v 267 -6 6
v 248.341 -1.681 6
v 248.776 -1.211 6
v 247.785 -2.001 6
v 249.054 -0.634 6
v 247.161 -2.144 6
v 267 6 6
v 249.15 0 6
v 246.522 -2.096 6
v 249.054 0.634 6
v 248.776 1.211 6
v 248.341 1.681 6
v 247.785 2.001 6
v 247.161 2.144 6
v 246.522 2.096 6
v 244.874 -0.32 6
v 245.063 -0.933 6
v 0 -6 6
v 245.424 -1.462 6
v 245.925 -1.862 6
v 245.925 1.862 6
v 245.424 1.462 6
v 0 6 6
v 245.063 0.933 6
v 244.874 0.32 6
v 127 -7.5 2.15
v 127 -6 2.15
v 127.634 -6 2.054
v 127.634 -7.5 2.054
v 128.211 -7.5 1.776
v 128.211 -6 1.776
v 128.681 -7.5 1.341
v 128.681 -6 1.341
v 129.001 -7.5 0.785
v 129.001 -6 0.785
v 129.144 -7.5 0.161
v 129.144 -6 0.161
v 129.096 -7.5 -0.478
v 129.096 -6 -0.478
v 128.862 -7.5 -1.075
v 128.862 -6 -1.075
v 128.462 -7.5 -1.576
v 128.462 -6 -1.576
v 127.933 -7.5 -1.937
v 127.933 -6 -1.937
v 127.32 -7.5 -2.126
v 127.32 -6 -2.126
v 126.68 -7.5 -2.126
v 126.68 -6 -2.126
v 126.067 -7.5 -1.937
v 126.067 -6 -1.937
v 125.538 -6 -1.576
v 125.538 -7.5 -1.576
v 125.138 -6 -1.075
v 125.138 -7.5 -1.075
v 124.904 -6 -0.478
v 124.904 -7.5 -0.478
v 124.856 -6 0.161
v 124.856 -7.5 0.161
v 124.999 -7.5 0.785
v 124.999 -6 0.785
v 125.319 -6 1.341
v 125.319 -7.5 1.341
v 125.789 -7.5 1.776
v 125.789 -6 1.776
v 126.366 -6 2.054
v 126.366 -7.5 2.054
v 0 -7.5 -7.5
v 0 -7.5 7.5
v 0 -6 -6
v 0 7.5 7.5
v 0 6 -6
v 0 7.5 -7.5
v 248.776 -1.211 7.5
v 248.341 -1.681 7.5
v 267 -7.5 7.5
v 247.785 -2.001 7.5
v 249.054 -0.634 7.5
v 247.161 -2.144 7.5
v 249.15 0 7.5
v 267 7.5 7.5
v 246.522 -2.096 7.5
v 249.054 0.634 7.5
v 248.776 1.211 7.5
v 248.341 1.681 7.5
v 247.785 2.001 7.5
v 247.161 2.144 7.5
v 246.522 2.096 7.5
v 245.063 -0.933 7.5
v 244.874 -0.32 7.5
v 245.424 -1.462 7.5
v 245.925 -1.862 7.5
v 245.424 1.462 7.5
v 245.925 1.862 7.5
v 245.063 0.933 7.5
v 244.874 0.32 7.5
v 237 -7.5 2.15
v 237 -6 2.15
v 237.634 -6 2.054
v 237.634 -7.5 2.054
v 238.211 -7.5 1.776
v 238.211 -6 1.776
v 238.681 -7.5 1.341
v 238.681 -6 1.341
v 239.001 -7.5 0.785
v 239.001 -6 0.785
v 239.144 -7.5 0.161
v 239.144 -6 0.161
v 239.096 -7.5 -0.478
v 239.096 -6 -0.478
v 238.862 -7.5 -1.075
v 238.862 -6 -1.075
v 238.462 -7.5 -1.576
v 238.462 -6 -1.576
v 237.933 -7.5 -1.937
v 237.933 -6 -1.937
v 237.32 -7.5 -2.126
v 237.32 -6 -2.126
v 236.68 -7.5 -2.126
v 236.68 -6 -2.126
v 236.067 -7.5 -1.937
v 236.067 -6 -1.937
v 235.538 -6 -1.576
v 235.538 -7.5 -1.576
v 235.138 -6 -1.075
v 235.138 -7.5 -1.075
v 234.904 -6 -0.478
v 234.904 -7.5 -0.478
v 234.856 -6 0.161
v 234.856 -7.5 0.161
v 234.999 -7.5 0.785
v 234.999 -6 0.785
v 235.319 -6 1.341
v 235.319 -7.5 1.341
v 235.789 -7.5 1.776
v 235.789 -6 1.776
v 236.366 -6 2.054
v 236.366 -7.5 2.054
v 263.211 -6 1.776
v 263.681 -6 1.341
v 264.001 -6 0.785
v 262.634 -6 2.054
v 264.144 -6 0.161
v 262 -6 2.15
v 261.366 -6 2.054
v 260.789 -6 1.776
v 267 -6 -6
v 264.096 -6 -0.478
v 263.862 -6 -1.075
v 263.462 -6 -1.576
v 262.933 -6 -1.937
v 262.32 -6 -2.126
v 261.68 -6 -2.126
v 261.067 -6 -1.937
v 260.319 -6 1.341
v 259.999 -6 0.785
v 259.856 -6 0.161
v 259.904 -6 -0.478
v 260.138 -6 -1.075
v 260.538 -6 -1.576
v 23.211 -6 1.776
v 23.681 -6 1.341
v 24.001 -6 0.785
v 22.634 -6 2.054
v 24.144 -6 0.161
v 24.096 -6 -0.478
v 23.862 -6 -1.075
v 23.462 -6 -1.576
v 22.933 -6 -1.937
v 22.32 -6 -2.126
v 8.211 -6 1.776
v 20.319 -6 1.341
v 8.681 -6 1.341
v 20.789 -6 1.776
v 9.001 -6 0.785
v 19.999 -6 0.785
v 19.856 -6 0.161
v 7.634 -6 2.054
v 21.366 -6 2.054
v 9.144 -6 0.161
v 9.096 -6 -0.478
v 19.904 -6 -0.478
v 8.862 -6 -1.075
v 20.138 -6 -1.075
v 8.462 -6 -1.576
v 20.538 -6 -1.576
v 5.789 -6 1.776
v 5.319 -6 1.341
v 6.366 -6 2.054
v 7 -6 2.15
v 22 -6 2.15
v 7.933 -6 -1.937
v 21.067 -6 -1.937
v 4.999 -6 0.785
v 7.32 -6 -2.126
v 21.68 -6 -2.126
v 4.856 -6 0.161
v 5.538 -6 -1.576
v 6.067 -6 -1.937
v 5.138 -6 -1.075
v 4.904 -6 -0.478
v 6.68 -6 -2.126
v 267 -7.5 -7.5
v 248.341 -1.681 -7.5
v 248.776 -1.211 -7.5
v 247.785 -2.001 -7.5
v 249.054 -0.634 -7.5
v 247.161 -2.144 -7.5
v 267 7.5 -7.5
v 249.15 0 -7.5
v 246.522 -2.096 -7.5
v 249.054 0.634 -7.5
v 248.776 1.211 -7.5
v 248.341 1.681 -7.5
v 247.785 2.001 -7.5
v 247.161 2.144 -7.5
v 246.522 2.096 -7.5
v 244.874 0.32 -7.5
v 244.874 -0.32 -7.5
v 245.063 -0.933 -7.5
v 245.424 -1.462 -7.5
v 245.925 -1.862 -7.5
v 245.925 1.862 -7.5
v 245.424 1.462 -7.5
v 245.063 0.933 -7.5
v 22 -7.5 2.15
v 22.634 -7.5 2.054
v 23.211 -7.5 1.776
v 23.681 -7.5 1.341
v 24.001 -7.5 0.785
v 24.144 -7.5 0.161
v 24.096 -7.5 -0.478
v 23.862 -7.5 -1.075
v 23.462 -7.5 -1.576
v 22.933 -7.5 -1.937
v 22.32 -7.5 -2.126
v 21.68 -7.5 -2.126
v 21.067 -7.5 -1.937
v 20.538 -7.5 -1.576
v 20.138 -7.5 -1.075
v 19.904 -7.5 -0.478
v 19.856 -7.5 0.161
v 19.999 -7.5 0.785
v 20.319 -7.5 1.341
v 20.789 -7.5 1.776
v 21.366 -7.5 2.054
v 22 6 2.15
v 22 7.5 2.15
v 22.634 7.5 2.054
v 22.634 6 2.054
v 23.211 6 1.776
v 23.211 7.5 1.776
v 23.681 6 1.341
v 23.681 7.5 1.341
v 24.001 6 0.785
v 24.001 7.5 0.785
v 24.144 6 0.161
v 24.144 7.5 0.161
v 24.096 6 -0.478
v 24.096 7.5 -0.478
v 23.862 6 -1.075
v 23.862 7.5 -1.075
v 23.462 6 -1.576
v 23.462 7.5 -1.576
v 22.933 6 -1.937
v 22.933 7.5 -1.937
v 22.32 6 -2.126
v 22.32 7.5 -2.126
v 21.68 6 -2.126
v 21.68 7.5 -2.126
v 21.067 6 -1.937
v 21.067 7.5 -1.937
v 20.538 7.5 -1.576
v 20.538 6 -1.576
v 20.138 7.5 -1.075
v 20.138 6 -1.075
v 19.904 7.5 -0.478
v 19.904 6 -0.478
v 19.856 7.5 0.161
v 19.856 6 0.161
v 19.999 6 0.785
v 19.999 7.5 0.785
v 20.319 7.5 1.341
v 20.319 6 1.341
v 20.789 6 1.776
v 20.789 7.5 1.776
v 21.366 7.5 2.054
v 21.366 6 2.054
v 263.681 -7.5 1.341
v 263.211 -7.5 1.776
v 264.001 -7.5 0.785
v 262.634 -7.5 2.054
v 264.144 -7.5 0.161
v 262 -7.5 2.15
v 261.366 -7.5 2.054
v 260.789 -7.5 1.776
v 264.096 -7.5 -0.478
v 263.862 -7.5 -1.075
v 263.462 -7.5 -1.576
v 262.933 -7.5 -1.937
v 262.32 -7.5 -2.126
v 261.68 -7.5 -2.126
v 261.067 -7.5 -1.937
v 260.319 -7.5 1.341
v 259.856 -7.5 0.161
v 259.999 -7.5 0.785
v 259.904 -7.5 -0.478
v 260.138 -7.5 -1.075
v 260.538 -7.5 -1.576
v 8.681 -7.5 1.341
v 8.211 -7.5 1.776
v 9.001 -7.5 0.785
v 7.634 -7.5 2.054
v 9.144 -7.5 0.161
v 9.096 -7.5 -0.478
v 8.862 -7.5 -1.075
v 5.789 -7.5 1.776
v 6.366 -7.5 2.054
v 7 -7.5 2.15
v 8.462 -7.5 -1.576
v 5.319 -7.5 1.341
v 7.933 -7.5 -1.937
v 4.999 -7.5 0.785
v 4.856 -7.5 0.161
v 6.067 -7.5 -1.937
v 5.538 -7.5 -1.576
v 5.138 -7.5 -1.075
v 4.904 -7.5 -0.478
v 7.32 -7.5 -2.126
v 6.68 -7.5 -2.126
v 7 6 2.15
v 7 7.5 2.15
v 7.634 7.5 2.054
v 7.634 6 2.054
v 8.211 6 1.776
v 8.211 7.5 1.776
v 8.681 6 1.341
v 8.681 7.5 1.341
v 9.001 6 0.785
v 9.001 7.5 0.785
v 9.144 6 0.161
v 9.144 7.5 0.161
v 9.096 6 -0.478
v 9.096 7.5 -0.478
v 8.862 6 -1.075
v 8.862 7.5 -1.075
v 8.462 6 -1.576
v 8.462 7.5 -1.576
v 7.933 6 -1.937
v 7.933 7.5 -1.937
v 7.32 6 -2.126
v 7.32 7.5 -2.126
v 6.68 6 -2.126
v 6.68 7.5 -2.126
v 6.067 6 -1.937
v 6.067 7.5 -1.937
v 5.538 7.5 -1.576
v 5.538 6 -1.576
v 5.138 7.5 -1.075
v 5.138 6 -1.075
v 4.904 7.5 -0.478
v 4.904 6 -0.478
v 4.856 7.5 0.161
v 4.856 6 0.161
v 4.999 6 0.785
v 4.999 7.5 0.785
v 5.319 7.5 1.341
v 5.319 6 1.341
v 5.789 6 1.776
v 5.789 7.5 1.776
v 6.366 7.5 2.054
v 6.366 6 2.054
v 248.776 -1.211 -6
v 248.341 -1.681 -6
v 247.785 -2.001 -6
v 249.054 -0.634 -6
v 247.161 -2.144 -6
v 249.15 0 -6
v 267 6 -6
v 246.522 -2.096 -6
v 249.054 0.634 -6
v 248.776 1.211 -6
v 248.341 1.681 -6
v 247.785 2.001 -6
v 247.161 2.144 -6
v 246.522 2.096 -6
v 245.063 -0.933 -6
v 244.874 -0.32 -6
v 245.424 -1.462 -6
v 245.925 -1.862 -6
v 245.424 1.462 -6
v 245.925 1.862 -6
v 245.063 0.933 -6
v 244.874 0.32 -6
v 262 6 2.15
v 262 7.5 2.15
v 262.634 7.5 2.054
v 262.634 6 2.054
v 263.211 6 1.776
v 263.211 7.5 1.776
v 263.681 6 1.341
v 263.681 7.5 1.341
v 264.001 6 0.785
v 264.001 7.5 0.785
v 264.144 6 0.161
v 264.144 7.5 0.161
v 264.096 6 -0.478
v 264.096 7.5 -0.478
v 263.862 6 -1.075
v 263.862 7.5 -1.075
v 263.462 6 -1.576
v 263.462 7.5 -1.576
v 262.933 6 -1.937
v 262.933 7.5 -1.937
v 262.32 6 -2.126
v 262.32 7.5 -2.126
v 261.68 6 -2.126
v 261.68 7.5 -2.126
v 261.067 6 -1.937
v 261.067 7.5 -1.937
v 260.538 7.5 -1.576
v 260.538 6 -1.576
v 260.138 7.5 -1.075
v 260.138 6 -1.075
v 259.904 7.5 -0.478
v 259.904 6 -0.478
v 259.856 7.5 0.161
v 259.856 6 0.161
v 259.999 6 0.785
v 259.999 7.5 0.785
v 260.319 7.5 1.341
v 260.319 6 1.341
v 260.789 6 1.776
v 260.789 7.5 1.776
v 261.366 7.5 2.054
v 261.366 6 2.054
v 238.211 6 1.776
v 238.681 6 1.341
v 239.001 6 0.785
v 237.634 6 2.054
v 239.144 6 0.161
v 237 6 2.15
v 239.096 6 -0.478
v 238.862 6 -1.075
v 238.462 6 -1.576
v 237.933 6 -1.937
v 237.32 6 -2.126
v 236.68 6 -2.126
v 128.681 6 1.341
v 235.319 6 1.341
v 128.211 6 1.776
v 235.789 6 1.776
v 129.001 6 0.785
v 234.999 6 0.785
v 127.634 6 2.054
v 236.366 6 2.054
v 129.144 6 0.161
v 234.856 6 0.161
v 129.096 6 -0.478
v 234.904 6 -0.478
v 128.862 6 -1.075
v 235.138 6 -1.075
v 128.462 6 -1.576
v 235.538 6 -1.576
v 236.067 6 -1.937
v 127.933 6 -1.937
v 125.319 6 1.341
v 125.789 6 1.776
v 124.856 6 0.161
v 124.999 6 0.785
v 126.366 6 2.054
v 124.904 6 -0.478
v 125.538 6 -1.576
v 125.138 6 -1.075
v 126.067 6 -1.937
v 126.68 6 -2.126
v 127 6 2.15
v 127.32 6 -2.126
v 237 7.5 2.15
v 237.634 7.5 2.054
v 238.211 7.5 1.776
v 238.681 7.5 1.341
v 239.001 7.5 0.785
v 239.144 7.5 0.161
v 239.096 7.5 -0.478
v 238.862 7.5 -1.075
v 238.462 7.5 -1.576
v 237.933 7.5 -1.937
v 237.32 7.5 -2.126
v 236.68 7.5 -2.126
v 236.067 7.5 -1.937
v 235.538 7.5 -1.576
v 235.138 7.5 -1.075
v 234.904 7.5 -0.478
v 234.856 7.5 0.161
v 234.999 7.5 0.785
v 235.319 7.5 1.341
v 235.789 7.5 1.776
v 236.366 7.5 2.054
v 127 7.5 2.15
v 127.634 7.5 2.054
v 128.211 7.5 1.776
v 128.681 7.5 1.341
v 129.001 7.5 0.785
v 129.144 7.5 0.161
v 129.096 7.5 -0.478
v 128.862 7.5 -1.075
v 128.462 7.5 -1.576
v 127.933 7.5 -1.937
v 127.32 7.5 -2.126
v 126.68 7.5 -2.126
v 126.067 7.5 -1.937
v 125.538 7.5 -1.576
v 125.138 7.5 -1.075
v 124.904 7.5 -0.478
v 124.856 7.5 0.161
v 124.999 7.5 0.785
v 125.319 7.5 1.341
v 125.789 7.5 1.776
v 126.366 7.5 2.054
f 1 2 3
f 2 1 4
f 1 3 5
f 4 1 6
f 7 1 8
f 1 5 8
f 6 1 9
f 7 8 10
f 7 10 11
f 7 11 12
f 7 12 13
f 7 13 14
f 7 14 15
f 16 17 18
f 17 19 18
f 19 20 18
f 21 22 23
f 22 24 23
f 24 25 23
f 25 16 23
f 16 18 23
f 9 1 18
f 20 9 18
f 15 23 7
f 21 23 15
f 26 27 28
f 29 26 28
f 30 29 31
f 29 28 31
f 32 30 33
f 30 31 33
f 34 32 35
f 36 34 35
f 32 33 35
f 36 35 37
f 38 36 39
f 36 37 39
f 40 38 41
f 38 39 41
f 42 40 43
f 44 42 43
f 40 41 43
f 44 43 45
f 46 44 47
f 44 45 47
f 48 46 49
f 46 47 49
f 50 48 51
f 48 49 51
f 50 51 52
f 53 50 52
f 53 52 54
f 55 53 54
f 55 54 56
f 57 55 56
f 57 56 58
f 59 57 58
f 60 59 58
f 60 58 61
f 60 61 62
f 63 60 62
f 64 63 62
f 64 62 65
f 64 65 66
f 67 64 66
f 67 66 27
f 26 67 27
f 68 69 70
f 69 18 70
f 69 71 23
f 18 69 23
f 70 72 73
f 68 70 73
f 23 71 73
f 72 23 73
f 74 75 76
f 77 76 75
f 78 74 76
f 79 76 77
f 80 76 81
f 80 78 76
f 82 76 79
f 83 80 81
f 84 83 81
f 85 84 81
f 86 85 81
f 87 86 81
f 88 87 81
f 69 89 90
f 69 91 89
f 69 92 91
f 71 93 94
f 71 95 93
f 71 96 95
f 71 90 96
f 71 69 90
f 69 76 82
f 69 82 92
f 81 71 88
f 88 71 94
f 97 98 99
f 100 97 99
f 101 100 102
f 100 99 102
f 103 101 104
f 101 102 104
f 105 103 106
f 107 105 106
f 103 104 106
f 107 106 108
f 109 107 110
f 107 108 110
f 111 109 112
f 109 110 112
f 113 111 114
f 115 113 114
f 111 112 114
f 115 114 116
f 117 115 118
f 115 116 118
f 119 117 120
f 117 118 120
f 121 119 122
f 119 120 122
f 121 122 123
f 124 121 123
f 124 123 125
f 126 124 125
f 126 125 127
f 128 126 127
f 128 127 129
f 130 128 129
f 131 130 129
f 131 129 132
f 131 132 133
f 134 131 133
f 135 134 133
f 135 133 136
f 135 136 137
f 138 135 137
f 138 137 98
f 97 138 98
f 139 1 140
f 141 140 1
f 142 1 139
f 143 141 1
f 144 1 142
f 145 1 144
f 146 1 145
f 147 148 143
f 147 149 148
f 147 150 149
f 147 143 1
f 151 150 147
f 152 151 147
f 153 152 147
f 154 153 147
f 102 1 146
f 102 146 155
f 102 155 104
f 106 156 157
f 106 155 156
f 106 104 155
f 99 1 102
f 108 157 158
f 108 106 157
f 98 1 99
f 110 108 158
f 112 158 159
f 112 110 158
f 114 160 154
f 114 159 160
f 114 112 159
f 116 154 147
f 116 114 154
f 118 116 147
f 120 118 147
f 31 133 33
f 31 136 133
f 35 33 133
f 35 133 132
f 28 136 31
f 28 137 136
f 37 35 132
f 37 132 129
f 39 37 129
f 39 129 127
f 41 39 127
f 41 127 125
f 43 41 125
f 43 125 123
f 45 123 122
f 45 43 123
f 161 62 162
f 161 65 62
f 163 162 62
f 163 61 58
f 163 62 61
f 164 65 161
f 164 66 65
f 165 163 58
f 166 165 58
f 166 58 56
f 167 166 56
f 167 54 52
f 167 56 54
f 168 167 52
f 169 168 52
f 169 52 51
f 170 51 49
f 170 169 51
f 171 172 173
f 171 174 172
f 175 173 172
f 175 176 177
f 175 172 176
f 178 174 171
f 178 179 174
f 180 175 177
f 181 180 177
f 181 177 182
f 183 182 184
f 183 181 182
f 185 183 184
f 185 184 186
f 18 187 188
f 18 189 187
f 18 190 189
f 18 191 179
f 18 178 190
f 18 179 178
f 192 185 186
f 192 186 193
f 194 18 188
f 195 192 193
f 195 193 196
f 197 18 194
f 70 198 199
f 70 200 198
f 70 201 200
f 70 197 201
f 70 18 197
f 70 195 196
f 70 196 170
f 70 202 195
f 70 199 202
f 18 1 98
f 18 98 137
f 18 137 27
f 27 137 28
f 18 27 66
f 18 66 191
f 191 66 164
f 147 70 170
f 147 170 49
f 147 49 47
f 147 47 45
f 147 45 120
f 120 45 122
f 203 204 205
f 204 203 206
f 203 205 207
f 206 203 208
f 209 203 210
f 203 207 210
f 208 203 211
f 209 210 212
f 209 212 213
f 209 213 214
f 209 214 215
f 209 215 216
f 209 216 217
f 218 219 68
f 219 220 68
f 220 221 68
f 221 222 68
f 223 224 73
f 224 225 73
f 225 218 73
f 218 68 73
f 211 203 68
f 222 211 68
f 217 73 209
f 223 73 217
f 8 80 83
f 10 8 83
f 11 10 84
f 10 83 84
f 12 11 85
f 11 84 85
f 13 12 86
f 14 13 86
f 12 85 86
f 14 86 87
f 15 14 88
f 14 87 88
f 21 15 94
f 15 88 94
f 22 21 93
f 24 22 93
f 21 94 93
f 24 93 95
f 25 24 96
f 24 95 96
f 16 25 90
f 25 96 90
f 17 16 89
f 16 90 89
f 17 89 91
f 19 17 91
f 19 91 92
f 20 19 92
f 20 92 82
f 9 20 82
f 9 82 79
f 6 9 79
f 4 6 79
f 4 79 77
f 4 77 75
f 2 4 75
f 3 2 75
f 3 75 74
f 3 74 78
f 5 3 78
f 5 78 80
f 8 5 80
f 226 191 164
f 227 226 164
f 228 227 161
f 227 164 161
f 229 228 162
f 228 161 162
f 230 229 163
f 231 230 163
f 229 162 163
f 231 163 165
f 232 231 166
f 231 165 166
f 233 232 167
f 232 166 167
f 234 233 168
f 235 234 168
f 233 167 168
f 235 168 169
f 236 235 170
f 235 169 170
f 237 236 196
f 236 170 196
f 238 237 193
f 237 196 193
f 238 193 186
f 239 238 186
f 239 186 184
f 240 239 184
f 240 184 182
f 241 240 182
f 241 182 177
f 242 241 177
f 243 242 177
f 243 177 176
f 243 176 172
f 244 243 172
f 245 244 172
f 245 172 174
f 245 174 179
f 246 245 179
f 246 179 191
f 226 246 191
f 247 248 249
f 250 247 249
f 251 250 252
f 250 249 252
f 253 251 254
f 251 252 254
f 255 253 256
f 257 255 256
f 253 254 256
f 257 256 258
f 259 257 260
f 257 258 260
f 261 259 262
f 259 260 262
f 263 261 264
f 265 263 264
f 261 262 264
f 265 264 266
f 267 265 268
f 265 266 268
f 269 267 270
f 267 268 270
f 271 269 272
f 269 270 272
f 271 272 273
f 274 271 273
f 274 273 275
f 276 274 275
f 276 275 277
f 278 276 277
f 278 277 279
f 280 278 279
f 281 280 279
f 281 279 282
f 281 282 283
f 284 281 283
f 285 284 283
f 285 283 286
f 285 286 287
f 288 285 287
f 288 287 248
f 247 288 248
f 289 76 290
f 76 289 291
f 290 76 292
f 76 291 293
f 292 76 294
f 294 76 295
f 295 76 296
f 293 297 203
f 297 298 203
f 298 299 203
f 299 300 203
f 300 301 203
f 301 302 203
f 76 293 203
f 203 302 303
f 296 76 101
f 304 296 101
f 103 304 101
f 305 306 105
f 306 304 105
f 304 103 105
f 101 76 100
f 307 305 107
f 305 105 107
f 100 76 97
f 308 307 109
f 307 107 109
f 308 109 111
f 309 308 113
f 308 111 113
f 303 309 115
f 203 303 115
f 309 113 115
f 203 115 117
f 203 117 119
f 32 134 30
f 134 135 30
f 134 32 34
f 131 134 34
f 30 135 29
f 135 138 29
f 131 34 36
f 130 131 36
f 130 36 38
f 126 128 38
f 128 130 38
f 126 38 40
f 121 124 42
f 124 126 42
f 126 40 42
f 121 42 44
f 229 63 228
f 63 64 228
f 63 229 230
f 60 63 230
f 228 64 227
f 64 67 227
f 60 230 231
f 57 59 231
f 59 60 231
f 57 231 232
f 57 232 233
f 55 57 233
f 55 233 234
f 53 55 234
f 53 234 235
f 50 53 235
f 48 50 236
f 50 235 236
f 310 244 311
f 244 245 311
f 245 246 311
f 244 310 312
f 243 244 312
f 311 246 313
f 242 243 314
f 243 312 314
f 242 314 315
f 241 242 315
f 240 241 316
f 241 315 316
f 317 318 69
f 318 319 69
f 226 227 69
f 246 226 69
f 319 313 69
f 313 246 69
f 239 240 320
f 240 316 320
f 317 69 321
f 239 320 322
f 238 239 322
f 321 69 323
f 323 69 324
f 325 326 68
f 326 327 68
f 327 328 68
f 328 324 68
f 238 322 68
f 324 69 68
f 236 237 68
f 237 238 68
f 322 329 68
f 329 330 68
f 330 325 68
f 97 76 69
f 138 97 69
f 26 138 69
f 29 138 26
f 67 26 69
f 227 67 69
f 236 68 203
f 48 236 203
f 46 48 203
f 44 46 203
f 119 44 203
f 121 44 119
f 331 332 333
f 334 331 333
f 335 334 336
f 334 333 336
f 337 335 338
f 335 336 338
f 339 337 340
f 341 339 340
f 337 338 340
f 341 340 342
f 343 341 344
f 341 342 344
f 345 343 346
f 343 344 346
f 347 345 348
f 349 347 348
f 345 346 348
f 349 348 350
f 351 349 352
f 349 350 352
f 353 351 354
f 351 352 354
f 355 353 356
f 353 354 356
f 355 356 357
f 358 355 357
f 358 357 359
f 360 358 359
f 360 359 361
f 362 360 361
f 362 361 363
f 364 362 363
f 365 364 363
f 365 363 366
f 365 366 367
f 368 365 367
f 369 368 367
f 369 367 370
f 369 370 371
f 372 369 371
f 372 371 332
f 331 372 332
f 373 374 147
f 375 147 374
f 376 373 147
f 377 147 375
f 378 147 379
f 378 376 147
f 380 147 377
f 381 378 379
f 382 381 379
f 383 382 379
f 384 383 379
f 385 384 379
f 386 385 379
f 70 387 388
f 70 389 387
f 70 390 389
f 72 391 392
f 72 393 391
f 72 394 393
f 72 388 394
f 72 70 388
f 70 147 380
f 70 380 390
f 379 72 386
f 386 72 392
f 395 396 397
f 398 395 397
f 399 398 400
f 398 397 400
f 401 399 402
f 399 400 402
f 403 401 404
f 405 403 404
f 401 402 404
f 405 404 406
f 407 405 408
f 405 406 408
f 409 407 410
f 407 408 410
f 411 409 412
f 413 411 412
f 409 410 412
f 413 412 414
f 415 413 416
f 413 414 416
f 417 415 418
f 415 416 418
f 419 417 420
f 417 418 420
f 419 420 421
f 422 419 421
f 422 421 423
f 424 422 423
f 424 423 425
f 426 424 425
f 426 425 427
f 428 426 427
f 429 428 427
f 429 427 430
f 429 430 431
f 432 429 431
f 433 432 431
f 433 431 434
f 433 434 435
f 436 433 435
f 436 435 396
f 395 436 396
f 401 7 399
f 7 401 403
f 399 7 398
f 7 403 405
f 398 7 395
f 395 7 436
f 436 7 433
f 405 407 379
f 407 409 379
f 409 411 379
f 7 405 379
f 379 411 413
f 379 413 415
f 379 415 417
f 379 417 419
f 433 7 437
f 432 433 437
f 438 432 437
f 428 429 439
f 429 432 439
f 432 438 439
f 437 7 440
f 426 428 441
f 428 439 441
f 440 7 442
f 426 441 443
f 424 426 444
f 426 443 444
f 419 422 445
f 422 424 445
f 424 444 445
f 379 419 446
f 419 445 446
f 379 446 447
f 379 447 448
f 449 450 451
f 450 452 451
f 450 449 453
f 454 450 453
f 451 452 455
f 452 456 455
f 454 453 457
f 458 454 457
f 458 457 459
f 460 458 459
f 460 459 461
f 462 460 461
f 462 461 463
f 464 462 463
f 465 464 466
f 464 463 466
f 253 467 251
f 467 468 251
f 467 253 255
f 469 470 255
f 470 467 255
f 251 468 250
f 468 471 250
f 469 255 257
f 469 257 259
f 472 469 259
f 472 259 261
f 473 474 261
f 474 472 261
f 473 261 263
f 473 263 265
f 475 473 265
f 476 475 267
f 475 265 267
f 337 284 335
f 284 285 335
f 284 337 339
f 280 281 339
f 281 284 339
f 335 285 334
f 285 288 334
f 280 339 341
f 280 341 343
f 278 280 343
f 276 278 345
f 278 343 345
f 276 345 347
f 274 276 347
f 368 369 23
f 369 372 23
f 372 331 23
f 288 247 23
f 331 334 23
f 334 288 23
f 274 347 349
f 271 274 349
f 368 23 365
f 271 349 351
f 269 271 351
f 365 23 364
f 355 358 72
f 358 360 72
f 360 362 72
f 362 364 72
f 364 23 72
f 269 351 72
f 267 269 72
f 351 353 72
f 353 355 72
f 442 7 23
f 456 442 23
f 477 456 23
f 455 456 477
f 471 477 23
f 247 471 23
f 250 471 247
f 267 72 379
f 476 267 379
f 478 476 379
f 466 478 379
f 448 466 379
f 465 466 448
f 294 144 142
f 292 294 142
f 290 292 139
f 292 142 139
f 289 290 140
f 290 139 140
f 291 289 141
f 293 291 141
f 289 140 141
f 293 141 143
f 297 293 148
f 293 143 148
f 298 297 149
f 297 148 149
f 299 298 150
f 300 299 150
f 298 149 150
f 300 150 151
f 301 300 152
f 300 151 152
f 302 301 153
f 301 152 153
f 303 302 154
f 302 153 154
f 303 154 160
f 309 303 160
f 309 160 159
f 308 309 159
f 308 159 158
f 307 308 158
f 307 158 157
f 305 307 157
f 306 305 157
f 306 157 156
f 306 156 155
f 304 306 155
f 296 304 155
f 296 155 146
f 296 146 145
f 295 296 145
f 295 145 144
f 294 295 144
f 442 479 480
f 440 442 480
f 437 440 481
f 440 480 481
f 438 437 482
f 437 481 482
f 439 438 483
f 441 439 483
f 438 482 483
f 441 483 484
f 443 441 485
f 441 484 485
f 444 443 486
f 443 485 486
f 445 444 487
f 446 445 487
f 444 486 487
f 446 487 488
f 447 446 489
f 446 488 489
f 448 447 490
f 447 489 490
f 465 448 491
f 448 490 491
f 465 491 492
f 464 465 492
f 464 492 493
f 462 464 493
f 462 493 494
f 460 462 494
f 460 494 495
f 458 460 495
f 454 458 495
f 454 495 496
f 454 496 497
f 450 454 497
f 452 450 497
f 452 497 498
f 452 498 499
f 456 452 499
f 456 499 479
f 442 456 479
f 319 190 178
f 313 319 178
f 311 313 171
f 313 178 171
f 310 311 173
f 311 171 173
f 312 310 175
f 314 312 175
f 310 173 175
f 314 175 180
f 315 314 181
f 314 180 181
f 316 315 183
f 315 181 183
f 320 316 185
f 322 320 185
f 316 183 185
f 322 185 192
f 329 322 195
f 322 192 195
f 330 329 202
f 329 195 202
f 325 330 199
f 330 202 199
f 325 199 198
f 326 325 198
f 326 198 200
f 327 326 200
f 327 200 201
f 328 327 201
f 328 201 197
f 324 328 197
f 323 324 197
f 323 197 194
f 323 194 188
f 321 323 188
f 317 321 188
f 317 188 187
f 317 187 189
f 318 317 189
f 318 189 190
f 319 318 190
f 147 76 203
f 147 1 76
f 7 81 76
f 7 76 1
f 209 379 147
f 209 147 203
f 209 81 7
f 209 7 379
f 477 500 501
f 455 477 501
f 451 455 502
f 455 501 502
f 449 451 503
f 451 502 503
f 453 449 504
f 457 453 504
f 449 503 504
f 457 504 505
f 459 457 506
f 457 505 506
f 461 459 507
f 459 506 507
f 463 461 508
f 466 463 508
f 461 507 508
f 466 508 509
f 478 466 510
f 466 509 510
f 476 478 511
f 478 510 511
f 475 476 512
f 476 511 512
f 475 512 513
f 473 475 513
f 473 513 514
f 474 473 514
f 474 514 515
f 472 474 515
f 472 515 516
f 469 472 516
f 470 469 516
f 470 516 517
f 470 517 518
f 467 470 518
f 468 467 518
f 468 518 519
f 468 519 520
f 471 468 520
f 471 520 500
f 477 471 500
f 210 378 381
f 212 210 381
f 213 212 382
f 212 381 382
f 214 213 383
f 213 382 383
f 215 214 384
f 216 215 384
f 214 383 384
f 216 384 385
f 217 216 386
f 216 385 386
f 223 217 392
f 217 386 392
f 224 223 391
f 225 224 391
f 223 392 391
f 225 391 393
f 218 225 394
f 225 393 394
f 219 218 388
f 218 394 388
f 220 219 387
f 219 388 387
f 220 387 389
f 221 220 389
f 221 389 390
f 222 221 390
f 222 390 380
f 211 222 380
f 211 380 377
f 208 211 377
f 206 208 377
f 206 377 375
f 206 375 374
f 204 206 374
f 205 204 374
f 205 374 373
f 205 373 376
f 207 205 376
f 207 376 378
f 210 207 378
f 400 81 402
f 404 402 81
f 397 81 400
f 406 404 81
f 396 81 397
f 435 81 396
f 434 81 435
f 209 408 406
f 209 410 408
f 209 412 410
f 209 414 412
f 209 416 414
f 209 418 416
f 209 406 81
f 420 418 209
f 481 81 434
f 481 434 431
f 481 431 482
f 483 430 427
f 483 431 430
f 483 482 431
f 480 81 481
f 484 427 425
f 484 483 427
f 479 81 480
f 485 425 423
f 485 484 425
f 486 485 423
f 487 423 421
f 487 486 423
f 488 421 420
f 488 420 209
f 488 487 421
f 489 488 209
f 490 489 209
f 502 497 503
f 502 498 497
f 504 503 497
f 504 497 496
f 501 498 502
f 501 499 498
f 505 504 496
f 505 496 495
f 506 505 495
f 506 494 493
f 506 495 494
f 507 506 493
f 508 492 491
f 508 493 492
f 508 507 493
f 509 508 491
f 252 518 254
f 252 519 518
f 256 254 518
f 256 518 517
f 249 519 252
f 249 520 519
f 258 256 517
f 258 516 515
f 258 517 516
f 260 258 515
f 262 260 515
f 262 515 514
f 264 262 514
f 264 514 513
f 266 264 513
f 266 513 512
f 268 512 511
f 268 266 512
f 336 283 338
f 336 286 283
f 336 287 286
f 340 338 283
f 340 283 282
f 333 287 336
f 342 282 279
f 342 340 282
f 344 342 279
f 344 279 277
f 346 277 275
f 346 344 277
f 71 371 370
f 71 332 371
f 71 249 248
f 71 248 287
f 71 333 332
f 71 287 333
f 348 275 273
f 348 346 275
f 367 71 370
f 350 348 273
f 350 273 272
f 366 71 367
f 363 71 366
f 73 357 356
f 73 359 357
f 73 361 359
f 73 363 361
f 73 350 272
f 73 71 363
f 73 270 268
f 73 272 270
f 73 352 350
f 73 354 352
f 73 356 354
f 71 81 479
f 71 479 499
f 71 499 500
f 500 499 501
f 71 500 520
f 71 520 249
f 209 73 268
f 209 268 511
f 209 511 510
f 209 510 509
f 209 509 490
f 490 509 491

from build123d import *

# Parameters (mm, degrees)
SKETCH_1_W          = 15
SKETCH_1_H          = 15
SKETCH_1_W_2        = 12
SKETCH_1_H_2        = 12
EXTRUDE_1_DEPTH     = 267
SKETCH_2_R          = 2.15
CUT_EXTRUDE_1_DEPTH = 268.526166944
SKETCH_3_R          = 2.15
CUT_EXTRUDE_2_DEPTH = 268.526166944


with BuildPart() as part:
    # ｽｹｯﾁ1 → 押し出し-薄板1 (new body)
    with BuildSketch(Plane(origin=(0, 0, 0), x_dir=(0, 0, -1), z_dir=(1, 0, 0))):
        Rectangle(SKETCH_1_W, SKETCH_1_H)
        Rectangle(SKETCH_1_W_2, SKETCH_1_H_2, mode=Mode.SUBTRACT)
    extrude(amount=EXTRUDE_1_DEPTH)

    # ｽｹｯﾁ2 → ｶｯﾄ - 押し出し1 (cut, through all)
    with BuildSketch(Plane(origin=(0, 7.5, 0), x_dir=(1, 0, 0), z_dir=(0, 1, 0))):
        with Locations(Location((262, 0, 0), (0, 0, 270))):
            Circle(SKETCH_2_R)
        with Locations(Location((22, 0, 0), (0, 0, 270))):
            Circle(SKETCH_2_R)
        with Locations(Location((7, 0, 0), (0, 0, 270))):
            Circle(SKETCH_2_R)
        with Locations(Location((237, 0, 0), (0, 0, 270))):
            Circle(SKETCH_2_R)
        with Locations(Location((127, 0, 0), (0, 0, 270))):
            Circle(SKETCH_2_R)
    extrude(amount=-CUT_EXTRUDE_1_DEPTH, mode=Mode.SUBTRACT)

    # ｽｹｯﾁ3 → ｶｯﾄ - 押し出し2 (cut, through all)
    with BuildSketch(Plane.XY.offset(7.5)):
        with Locations((247, 0)):
            Circle(SKETCH_3_R)
    extrude(amount=-CUT_EXTRUDE_2_DEPTH, mode=Mode.SUBTRACT)


solid = part.part
